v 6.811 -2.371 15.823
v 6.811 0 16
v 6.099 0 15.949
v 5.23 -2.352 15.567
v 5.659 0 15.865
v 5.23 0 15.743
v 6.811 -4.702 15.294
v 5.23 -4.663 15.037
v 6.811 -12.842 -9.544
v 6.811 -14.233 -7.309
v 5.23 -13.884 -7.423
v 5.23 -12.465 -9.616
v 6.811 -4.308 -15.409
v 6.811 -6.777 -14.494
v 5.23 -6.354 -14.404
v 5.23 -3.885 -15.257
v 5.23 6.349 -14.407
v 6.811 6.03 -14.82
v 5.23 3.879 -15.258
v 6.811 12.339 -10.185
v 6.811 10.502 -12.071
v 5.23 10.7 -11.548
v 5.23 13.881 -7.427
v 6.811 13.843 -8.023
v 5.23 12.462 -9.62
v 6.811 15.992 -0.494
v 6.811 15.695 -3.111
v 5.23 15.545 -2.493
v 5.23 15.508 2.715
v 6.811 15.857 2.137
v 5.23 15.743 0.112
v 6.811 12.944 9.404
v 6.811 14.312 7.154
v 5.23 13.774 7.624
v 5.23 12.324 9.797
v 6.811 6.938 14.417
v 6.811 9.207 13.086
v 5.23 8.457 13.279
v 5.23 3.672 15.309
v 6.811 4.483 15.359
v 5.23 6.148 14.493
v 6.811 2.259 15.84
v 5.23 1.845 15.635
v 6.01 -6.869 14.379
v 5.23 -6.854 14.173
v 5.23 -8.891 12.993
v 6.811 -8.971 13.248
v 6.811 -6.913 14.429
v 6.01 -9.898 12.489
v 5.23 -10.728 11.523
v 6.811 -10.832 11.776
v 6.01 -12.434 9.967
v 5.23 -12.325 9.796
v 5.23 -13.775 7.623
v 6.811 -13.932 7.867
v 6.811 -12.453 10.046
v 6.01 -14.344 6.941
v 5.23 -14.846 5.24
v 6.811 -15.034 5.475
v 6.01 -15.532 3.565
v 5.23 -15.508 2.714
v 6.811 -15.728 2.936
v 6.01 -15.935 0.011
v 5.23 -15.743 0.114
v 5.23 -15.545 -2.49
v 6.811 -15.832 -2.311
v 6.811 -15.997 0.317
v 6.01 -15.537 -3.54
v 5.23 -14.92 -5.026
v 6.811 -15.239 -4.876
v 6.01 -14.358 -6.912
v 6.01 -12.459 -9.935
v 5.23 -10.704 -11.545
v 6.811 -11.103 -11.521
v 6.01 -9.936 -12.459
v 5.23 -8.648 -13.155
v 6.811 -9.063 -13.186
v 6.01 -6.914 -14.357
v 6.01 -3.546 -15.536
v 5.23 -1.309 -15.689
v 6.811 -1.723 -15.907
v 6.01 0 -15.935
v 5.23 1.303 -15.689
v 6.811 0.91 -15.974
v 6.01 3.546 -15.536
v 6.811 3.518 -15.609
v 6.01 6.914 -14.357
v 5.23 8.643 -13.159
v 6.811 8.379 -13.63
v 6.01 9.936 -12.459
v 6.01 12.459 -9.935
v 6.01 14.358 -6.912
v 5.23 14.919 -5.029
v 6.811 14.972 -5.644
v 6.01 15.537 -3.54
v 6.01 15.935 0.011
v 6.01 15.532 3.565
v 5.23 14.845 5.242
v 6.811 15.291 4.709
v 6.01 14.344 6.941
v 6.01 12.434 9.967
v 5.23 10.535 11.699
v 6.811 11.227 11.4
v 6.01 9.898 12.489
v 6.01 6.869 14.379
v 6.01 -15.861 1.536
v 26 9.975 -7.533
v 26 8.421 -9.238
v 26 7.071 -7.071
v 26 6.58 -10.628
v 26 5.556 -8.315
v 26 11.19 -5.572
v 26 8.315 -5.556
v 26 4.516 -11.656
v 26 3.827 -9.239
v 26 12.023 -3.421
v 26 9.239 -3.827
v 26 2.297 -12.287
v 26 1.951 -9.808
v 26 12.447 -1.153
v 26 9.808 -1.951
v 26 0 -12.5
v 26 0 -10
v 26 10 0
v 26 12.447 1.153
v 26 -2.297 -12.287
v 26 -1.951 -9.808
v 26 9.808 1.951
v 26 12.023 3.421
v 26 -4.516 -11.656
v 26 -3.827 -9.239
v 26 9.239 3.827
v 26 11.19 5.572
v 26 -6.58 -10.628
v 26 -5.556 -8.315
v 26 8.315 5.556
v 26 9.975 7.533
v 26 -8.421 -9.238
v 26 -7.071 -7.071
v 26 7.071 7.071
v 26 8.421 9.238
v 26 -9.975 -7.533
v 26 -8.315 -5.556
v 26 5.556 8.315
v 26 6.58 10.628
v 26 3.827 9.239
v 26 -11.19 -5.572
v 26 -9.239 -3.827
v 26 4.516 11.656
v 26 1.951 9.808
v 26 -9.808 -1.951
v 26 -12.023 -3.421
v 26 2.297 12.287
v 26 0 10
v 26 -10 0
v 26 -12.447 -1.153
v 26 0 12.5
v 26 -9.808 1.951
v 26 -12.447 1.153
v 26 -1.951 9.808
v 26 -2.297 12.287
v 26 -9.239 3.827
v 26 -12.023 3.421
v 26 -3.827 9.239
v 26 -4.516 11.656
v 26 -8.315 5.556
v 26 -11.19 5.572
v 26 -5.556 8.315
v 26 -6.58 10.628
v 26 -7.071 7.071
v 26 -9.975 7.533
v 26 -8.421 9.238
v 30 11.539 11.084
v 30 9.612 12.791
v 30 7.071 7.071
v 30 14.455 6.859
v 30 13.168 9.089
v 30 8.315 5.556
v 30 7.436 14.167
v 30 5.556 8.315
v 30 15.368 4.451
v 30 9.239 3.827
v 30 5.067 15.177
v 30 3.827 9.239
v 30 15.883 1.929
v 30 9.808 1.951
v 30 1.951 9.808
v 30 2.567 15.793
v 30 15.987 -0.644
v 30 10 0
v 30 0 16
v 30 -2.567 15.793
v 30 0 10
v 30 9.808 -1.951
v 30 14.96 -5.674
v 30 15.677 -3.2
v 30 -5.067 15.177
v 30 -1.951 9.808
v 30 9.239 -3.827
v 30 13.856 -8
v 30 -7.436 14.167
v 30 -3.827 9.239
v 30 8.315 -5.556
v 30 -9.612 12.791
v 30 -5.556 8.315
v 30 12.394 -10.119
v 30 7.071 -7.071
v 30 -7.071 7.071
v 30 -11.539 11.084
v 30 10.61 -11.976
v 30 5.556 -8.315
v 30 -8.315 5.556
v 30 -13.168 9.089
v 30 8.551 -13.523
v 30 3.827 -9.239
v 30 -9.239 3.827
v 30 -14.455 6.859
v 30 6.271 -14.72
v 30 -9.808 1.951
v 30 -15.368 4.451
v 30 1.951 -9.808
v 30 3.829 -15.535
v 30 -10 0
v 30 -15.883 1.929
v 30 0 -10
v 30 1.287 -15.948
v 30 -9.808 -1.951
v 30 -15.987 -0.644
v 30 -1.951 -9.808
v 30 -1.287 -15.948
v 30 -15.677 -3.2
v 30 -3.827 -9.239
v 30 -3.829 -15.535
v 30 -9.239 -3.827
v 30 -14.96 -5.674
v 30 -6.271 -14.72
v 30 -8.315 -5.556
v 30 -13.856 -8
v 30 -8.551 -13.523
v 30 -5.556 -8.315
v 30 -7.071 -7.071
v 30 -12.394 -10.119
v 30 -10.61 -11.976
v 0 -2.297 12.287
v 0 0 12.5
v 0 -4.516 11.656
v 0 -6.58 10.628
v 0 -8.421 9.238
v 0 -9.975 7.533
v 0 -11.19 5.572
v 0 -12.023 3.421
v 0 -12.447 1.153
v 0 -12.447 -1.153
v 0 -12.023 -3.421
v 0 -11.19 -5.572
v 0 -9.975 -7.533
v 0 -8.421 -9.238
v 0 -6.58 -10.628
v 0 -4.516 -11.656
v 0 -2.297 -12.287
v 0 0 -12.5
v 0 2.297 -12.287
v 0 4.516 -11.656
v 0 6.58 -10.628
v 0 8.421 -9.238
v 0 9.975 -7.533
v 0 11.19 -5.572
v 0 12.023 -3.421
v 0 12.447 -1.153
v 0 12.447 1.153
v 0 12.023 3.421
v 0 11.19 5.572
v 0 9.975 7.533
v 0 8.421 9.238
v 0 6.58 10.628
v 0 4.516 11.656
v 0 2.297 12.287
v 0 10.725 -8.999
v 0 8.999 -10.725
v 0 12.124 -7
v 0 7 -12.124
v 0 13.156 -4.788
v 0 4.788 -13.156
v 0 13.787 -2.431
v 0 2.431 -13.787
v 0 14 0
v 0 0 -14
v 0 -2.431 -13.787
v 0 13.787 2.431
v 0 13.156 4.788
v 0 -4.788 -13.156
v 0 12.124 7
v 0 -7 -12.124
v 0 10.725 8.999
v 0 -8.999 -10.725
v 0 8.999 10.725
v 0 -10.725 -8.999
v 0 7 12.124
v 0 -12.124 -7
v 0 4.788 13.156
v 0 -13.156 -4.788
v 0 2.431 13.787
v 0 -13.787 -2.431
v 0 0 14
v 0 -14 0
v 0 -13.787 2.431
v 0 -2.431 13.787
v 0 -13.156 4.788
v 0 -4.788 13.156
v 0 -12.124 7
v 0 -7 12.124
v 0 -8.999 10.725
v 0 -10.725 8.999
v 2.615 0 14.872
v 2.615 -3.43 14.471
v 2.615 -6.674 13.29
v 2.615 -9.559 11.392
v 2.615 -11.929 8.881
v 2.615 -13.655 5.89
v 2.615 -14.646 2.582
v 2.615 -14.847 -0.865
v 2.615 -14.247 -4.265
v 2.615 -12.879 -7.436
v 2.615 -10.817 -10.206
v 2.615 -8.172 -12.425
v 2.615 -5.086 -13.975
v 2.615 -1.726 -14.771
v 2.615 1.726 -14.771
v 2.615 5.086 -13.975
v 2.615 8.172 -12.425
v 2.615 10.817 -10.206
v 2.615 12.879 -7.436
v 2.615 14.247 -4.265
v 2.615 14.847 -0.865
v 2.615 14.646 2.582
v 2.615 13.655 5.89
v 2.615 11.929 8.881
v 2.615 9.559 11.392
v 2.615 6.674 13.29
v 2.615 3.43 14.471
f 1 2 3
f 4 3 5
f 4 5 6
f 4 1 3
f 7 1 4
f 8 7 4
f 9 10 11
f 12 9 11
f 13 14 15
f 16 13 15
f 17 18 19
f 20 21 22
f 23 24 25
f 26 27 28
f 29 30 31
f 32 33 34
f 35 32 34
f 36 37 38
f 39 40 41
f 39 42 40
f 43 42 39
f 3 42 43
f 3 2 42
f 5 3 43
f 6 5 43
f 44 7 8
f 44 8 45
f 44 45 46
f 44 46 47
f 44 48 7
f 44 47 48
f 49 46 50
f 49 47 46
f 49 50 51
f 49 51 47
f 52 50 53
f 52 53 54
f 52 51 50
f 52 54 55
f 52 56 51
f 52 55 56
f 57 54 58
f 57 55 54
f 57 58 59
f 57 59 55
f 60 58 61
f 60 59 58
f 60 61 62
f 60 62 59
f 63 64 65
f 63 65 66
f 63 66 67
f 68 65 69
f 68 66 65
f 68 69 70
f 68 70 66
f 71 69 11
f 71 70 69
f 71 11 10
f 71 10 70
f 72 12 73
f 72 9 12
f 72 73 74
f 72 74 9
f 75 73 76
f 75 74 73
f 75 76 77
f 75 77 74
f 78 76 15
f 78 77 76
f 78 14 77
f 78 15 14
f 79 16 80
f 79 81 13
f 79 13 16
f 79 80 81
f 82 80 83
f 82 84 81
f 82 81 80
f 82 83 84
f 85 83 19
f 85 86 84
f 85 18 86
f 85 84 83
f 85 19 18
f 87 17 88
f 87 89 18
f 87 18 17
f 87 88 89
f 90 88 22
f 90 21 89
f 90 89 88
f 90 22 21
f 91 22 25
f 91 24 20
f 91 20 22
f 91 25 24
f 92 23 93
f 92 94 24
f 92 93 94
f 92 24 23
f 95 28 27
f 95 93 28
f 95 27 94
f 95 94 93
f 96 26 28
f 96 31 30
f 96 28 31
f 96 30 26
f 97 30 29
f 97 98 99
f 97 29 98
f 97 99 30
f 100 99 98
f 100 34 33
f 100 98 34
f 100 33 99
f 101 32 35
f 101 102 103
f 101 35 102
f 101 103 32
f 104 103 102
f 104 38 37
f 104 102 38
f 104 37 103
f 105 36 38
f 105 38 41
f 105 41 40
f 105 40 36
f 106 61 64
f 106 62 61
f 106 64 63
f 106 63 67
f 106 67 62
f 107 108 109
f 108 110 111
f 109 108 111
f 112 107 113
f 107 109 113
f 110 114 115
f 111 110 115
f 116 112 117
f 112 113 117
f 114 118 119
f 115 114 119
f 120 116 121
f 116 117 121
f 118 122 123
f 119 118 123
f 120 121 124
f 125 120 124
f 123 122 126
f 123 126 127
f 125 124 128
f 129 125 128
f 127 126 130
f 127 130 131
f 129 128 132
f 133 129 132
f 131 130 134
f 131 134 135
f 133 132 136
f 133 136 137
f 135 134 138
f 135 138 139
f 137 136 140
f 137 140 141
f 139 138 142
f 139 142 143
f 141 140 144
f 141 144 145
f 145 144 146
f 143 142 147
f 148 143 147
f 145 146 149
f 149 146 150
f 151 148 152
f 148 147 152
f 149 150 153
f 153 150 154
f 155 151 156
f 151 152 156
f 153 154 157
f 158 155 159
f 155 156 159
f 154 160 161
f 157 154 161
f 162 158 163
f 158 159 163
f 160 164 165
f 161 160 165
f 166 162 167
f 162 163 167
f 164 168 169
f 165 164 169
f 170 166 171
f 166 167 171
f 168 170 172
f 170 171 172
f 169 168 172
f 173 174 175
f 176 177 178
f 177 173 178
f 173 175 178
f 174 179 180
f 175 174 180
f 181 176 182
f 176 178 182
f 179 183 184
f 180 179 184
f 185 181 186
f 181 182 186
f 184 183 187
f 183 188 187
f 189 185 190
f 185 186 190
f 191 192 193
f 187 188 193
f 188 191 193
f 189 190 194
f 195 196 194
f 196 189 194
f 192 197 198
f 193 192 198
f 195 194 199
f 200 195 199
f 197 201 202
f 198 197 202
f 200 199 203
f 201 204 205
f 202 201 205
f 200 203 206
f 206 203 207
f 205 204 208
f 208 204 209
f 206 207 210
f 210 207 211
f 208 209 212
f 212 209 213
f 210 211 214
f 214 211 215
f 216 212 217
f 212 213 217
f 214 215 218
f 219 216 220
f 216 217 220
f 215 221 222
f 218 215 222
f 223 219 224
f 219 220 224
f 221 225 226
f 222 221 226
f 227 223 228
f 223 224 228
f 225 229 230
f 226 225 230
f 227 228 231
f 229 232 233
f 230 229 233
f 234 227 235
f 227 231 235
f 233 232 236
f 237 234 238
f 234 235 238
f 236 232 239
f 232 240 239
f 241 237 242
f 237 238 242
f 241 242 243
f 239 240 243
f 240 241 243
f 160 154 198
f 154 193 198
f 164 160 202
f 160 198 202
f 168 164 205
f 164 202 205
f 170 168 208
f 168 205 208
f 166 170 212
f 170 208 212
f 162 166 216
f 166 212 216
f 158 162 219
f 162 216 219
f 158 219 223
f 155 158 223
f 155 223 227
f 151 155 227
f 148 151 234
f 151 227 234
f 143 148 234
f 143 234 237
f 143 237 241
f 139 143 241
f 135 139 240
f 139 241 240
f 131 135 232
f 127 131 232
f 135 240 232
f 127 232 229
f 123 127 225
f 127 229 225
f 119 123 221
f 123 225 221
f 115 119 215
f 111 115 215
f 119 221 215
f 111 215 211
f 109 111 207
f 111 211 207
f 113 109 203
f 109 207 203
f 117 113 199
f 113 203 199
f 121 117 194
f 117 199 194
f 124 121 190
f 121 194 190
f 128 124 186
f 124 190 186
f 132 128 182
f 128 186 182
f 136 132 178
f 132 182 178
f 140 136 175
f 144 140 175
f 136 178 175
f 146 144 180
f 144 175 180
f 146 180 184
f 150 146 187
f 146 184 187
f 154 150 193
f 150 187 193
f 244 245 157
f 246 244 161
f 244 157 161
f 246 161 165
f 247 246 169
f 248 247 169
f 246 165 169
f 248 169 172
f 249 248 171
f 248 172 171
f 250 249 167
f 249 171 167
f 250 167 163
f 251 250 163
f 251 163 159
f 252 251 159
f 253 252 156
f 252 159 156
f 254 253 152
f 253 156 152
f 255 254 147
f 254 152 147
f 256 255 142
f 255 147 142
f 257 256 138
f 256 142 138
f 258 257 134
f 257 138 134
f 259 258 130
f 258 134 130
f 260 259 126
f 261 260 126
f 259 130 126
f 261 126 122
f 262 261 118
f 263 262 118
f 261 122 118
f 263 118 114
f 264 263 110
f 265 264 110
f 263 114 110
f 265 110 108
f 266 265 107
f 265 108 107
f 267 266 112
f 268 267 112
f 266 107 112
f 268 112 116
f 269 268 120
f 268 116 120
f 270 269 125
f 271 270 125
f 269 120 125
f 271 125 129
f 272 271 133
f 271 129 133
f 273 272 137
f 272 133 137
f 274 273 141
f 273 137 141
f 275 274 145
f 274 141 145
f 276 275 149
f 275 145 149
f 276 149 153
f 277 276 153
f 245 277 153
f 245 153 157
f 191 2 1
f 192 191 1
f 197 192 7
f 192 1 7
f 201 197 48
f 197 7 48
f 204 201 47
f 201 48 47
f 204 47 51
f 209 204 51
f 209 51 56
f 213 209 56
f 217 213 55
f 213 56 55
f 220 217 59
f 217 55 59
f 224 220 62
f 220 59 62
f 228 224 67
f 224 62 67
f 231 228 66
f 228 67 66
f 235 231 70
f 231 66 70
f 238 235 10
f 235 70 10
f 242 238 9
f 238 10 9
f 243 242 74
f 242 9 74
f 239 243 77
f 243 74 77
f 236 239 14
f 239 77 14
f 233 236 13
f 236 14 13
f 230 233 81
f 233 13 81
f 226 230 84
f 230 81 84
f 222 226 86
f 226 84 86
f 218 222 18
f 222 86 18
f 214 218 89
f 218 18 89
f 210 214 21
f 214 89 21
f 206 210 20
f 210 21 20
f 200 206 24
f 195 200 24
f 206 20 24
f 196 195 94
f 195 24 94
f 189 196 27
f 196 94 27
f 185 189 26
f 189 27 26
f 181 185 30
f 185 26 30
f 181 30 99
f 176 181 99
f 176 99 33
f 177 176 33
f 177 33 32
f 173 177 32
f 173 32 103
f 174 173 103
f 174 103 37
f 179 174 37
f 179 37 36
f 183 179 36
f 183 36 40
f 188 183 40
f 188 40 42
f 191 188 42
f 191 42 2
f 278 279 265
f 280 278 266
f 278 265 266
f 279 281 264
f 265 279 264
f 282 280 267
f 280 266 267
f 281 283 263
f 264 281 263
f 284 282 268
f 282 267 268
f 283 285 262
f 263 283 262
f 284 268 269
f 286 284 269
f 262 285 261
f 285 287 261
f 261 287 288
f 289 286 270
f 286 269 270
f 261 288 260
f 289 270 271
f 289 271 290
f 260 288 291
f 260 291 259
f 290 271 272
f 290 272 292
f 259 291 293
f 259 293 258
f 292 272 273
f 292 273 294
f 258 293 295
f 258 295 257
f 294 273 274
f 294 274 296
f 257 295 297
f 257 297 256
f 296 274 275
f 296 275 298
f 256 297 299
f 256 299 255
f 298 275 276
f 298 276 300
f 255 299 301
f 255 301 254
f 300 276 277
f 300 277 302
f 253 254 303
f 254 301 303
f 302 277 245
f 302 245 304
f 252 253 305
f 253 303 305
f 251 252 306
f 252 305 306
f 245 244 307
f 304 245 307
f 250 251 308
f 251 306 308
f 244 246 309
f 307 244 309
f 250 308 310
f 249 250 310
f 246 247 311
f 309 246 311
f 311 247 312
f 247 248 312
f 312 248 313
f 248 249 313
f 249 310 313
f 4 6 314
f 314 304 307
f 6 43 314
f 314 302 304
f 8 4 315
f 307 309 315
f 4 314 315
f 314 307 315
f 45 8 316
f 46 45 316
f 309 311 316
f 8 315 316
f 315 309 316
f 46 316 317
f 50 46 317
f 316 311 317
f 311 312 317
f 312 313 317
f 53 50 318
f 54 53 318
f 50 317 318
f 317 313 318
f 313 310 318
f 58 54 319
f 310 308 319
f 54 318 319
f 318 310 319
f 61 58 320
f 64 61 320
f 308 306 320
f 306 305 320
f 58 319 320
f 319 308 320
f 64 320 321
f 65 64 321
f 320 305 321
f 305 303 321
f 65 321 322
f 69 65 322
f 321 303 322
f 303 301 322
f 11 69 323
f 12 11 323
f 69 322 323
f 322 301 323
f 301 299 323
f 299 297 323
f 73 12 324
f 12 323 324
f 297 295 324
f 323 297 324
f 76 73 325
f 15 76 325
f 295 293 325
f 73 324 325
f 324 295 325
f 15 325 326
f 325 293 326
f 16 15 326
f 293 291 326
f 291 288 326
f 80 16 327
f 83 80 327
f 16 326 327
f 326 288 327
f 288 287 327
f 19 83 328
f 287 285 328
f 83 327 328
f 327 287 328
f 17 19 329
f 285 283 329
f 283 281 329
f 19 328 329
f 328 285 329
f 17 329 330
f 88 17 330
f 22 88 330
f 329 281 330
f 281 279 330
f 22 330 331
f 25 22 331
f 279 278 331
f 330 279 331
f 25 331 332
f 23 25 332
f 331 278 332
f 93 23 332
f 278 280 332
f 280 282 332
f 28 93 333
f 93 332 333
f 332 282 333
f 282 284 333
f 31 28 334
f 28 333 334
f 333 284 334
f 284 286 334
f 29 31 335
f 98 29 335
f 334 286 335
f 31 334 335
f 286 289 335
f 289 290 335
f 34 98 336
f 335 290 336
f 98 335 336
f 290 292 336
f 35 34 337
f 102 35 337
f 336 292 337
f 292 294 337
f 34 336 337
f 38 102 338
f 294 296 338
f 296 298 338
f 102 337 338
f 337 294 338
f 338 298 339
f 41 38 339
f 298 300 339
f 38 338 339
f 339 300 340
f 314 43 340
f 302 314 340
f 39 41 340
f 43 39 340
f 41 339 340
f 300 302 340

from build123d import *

# Parameters (mm, degrees)
REDONDEO1_R = 5


with BuildPart() as part:
    # Croquis1 → Revolución1 (revolve)
    with BuildSketch(Plane.XY, mode=Mode.PRIVATE) as revoluci_n1_sk:
        Polygon((0, 12.5), (26, 12.5), (26, 10), (30, 10), (30, 16), (6, 16), (0, 14), align=None)
    revolve(revoluci_n1_sk.sketch.rotate(Axis((0, 0, 0), (1, 0, 0)), 90), axis=Axis((0, 0, 0), (1, 0, 0)))

    # Redondeo1
    redondeo1_edges = [part.edges().sort_by_distance(p)[0] for p in [
        (6, 0, -16),
    ]]
    fillet(redondeo1_edges, radius=REDONDEO1_R)


solid = part.part
